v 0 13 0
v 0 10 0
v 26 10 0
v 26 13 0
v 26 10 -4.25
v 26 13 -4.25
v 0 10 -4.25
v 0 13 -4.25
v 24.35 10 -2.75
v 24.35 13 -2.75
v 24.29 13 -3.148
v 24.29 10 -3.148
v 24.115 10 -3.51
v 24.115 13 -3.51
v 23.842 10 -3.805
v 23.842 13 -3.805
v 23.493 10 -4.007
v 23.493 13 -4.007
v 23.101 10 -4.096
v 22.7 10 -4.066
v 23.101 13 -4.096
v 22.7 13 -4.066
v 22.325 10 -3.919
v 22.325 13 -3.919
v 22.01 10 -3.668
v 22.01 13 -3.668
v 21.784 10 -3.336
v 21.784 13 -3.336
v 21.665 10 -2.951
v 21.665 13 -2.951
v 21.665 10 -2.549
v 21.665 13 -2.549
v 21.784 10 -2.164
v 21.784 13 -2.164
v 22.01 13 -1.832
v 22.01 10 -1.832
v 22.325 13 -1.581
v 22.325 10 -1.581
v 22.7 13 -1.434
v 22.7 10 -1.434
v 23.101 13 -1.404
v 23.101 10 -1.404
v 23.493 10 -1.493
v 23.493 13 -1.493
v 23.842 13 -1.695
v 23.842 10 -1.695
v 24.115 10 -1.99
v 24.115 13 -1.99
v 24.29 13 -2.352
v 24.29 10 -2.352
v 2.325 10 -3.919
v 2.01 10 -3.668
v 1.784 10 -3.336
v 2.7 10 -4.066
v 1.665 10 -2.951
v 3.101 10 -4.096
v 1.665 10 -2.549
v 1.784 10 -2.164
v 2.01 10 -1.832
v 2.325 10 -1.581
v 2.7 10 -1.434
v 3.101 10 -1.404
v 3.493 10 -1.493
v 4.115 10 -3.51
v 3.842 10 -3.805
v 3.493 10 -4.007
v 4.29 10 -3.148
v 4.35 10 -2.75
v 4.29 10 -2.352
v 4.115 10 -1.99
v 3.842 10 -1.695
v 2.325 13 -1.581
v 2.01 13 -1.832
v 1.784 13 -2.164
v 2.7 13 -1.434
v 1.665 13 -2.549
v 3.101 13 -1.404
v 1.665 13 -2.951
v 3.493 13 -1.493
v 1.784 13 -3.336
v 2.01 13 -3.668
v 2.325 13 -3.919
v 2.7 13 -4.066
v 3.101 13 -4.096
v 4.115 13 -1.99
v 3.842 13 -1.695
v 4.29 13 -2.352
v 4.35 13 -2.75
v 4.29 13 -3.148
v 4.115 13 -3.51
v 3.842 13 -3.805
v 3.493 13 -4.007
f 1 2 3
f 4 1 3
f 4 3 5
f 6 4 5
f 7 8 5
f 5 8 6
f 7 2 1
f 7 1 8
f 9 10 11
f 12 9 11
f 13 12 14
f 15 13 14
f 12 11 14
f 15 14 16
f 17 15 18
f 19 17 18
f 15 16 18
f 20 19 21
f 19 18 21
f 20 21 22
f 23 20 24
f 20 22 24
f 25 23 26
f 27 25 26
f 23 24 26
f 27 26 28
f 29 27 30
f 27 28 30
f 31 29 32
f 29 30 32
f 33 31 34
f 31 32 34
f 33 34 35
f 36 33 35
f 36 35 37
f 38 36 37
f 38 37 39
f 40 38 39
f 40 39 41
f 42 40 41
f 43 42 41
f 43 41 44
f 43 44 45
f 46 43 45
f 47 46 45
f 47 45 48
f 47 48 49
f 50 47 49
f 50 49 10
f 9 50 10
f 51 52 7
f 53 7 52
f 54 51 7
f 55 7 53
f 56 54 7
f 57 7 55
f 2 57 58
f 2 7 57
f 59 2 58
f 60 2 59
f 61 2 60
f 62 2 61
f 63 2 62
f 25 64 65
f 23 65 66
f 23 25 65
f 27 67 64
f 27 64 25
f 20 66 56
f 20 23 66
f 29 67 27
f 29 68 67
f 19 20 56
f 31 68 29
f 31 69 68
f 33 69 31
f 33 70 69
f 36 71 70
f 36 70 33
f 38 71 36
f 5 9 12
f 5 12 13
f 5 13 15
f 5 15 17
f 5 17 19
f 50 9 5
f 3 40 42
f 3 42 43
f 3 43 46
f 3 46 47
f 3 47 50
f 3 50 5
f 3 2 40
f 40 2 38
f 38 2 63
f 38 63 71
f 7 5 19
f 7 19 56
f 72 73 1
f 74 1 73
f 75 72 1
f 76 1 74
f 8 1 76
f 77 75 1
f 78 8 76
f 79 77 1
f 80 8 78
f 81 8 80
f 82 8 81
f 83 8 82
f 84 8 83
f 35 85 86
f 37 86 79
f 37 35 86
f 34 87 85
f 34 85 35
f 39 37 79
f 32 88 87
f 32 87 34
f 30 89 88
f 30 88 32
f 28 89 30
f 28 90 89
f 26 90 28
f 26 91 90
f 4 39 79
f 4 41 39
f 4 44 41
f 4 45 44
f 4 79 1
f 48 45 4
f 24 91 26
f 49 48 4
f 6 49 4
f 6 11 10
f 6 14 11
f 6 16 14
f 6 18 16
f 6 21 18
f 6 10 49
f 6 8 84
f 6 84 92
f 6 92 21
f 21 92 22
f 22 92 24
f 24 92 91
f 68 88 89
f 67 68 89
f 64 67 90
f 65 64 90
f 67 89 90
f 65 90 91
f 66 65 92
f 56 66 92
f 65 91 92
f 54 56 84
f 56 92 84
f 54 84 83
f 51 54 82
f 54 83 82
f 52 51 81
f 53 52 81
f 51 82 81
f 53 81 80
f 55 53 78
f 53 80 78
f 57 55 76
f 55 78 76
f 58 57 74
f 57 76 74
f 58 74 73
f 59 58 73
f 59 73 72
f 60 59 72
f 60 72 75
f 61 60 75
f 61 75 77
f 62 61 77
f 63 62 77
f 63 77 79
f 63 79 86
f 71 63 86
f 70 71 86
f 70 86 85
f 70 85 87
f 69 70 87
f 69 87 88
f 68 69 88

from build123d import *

# Parameters (mm, degrees)
SKETCH1_W           = 26
SKETCH1_H           = 18
BOSS_EXTRUDE1_DEPTH = 13
SKETCH2_R           = 1.35
CUT_EXTRUDE1_DEPTH  = 14
SKETCH3_W           = 26
SKETCH3_H           = 13.75
CUT_EXTRUDE3_DEPTH  = 14
SKETCH4_W           = 26
SKETCH4_H           = 10
CUT_EXTRUDE4_DEPTH  = 5.25


with BuildPart() as part:
    # Sketch1 → Boss-Extrude1 (new body)
    with BuildSketch(Plane(origin=(0, 0, 0), x_dir=(1, 0, 0), z_dir=(0, 1, 0))):
        with Locations((13, 9)):
            Rectangle(SKETCH1_W, SKETCH1_H)
    extrude(amount=BOSS_EXTRUDE1_DEPTH)

    # Sketch2 → Cut-Extrude1 (cut, through all)
    with BuildSketch(Plane(origin=(0, 13, 0), x_dir=(1, 0, 0), z_dir=(0, 1, 0))):
        with Locations((3, 15.25)):
            Circle(SKETCH2_R)
        with Locations((23, 15.25)):
            Circle(SKETCH2_R)
        with Locations((3, 2.75)):
            Circle(SKETCH2_R)
        with Locations((23, 2.75)):
            Circle(SKETCH2_R)
    extrude(amount=-CUT_EXTRUDE1_DEPTH, mode=Mode.SUBTRACT)

    # Sketch3 → Cut-Extrude3 (cut, through all)
    with BuildSketch(Plane(origin=(0, 13, 0), x_dir=(1, 0, 0), z_dir=(0, 1, 0))):
        with Locations((13, 11.125)):
            Rectangle(SKETCH3_W, SKETCH3_H)
    extrude(amount=-CUT_EXTRUDE3_DEPTH, mode=Mode.SUBTRACT)

    # Sketch4 → Cut-Extrude4 (cut, through all)
    with BuildSketch(Plane.XY):
        with Locations((13, 5)):
            Rectangle(SKETCH4_W, SKETCH4_H)
    extrude(amount=-CUT_EXTRUDE4_DEPTH, mode=Mode.SUBTRACT)


solid = part.part
